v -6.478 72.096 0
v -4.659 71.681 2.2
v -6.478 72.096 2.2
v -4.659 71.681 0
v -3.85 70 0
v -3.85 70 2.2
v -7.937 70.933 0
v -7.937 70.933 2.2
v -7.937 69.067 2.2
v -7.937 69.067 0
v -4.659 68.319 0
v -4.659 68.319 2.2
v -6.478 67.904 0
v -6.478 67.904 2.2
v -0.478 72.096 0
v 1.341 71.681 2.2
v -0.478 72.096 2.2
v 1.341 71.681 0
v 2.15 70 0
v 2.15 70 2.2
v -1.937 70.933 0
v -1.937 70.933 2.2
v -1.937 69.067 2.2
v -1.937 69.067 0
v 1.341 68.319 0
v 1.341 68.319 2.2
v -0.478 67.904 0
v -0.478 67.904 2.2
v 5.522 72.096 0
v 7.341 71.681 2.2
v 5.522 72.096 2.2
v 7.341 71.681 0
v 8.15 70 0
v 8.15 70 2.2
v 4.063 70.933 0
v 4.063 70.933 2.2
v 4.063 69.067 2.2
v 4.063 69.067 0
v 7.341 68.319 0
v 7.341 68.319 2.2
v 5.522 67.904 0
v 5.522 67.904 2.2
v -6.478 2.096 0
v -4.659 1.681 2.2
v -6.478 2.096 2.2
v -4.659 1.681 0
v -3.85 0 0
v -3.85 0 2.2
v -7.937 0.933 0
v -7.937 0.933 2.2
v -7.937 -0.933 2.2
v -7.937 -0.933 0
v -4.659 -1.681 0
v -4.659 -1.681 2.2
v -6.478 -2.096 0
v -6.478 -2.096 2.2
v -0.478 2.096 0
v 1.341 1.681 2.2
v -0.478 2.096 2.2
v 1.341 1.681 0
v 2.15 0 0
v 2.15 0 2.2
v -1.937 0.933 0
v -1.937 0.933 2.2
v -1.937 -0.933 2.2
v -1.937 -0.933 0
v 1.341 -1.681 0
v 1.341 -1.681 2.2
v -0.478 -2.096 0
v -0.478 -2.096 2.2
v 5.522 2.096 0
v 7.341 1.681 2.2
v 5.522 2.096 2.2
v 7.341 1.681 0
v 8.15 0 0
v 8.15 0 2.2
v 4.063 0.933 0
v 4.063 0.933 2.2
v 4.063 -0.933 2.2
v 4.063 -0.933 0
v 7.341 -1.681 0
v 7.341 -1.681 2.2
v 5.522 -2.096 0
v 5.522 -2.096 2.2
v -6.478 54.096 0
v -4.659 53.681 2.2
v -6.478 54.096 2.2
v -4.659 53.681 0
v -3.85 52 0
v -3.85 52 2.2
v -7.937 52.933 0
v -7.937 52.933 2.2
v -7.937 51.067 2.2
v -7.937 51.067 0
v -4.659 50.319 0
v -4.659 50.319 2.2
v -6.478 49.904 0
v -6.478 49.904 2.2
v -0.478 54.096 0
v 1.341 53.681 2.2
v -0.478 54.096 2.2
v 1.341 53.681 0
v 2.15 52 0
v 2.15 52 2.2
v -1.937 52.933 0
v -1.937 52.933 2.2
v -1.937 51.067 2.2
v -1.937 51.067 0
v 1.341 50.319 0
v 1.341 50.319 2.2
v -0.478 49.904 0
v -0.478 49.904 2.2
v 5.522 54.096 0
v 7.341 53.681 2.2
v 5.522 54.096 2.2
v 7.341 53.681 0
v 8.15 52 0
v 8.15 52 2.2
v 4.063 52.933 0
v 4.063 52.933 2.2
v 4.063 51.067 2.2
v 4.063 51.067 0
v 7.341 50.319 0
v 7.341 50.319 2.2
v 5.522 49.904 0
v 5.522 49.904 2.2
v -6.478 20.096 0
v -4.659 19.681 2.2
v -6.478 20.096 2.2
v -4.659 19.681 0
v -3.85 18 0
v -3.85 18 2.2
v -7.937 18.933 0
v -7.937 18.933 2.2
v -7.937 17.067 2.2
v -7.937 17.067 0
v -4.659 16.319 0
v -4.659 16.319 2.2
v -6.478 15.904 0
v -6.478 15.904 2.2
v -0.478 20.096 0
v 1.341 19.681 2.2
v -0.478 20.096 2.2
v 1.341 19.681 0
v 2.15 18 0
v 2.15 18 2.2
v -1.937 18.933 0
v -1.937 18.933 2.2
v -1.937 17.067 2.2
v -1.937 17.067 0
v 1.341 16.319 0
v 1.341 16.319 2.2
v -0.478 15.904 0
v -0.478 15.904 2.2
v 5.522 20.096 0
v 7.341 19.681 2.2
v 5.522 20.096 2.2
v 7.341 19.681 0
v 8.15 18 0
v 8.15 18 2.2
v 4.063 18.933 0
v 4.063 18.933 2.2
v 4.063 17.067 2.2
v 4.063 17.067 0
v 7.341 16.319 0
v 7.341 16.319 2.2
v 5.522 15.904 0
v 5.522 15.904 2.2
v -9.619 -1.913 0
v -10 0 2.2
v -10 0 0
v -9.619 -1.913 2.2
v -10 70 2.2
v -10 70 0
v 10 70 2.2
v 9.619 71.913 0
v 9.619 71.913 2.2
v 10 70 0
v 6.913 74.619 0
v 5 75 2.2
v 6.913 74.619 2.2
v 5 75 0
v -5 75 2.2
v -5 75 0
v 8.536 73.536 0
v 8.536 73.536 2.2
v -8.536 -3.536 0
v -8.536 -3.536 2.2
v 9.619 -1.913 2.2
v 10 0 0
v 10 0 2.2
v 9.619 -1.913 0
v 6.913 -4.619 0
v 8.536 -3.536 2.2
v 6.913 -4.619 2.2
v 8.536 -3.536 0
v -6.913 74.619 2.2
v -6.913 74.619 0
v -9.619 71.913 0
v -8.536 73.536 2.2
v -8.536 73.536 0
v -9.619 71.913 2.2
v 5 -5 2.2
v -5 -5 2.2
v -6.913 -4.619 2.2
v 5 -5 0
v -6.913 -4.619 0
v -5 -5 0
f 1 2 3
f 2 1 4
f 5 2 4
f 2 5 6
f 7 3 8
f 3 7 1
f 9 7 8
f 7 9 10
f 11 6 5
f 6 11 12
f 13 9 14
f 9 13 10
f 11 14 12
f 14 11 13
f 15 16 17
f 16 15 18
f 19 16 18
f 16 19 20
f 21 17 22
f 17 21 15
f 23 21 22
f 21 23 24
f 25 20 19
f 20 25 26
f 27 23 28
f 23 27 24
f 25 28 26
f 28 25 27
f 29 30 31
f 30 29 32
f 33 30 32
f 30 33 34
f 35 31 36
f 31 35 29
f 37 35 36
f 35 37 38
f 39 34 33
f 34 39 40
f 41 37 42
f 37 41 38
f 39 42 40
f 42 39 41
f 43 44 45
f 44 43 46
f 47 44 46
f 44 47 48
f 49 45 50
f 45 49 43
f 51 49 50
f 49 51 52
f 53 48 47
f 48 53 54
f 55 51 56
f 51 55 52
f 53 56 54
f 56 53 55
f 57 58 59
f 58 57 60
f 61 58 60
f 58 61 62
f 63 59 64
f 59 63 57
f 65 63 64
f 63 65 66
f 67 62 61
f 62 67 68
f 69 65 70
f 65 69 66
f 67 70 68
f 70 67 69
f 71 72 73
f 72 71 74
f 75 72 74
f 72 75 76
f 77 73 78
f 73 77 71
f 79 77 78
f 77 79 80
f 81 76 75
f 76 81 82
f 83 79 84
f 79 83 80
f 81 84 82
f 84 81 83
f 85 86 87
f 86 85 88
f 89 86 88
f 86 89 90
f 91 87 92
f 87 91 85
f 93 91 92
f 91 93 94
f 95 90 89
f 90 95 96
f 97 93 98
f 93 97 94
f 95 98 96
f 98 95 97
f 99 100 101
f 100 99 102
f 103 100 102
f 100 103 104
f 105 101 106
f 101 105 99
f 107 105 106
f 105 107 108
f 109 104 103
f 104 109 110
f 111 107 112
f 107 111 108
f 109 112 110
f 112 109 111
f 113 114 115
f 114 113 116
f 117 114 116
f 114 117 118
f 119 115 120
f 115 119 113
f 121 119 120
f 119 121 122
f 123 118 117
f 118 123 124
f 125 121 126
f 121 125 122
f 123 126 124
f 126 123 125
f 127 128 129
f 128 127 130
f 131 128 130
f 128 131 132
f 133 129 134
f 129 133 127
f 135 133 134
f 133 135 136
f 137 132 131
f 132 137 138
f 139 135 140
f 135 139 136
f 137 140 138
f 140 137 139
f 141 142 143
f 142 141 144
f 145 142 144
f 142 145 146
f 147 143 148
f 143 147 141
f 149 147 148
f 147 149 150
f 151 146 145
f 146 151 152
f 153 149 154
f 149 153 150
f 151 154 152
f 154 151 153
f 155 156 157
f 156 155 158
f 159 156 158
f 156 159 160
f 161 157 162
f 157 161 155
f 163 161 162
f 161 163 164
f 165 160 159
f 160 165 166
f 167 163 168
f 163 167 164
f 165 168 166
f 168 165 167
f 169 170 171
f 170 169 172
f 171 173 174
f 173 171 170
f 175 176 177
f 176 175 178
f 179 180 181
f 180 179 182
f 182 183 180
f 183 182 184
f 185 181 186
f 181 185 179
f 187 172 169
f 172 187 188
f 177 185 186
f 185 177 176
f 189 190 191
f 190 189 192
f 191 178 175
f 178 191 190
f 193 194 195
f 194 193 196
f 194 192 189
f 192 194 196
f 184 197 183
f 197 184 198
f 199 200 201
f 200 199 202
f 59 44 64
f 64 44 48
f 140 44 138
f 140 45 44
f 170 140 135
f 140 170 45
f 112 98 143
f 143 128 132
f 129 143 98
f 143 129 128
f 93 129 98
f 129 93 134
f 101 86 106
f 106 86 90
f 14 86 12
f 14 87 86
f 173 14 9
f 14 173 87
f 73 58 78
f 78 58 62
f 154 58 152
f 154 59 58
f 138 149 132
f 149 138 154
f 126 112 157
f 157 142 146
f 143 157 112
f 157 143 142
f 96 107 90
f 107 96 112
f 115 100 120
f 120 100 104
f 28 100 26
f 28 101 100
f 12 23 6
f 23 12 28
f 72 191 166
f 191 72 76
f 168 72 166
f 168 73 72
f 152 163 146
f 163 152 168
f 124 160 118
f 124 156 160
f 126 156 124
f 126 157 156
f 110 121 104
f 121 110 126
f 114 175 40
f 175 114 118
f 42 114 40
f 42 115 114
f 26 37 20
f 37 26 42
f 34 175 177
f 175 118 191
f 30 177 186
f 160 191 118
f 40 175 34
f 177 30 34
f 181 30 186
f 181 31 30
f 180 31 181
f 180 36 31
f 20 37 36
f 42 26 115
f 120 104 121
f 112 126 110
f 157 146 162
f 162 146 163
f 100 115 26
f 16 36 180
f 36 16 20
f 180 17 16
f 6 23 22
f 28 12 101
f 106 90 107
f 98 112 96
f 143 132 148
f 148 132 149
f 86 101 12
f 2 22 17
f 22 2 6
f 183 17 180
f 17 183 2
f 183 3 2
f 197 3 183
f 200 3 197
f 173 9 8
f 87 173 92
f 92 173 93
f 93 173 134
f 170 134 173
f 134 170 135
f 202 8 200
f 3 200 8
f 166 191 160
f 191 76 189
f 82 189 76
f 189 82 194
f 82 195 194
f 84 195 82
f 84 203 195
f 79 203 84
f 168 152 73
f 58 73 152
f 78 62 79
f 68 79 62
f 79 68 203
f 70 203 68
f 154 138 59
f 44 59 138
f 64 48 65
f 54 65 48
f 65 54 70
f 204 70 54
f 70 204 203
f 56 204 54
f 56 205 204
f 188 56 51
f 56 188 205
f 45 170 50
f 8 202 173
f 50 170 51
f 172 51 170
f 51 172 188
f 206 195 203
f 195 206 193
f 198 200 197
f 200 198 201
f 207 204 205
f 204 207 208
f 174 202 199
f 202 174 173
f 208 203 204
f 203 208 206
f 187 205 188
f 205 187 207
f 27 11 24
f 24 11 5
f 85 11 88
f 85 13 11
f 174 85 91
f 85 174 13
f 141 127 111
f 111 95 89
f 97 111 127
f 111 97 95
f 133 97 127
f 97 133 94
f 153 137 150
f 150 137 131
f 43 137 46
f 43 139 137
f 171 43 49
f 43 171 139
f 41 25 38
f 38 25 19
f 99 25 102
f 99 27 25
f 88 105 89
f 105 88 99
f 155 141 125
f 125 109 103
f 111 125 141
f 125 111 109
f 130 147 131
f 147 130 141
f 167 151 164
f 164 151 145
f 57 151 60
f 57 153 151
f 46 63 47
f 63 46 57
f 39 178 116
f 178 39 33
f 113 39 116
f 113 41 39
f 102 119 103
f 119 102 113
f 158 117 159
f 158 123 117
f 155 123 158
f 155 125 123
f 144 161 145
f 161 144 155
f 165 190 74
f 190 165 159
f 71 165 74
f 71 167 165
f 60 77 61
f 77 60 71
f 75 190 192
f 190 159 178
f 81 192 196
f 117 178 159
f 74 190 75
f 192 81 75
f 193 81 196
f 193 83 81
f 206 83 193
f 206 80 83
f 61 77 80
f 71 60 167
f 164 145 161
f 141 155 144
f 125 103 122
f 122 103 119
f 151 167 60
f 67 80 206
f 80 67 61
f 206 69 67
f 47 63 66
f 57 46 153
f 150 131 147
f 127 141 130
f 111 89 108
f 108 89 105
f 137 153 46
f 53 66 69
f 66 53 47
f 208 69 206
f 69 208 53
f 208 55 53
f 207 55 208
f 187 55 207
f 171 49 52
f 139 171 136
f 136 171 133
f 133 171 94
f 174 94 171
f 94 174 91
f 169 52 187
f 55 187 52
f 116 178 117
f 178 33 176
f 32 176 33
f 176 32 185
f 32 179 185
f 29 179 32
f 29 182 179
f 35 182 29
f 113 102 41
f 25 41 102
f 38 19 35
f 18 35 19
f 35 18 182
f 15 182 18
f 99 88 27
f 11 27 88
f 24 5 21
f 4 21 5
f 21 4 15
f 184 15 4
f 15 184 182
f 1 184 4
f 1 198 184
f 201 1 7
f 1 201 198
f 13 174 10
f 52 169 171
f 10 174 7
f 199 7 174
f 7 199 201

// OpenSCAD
// file: ../util/rounded.scad
// Do a rounded cube
module rounded(x=10, y=10, z=10, r=3, center=false) {
  if (center) {
    translate([-(x/2),-(y/2),0])
      rounded(x, y, z, r);
  } else {
    translate([r,r,0])
    minkowski() {
      cube([x-2*r,y-2*r,z/2]);
      cylinder(h=z/2, r=r);
    }
  }
}
// file: ../models/ollo.scad
// Diameter of plastic ollo holes
OlloHoles = 4.3;

// Width of Ollo "real" plastic
OlloWidth = 3;

// Distance between two ollo holes
OlloSpacing = 6;

// Do an Ollo hole on the part
module olloHole(depth=2.2)
{
    translate([0,0,-0.1])
      cylinder(depth+0.2, OlloHoles/2, OlloHoles/2);
}

// Do 3 ollo holes
module threeOllo(depth=2.2)
{
  for (xy=[[-OlloSpacing,0],[0,0],[OlloSpacing,0]]) {
    translate([xy[0], xy[1], 0])
    olloHole(depth);
  }
}

// Do a servo arm holes
module servoArm(depth=2.2)
{
    threeOllo(depth);
    rotate([0,0,90])
      threeOllo(depth);
}
// main file
include <../models/ollo.scad>;
use <../util/rounded.scad>;

module side(size=40, holesToBorder=5, thickness=2.2, print=false) {
    if (print) {
        translate([0,-size+holesToBorder,0])
            side(size,holesToBorder,thickness,false);
    } else {
        echo("[PART] side");
        translate([0,size-holesToBorder,0]) {
            difference() {
                rounded(20, size*2, thickness, 5, true);
                for (y=[size-holesToBorder,	 -size+holesToBorder,
                        size-holesToBorder-3*OlloSpacing, -size+holesToBorder+3*OlloSpacing]) {
                    translate([0, y, 0])
                        threeOllo();
                }
            }
        }
    }
}

side();
